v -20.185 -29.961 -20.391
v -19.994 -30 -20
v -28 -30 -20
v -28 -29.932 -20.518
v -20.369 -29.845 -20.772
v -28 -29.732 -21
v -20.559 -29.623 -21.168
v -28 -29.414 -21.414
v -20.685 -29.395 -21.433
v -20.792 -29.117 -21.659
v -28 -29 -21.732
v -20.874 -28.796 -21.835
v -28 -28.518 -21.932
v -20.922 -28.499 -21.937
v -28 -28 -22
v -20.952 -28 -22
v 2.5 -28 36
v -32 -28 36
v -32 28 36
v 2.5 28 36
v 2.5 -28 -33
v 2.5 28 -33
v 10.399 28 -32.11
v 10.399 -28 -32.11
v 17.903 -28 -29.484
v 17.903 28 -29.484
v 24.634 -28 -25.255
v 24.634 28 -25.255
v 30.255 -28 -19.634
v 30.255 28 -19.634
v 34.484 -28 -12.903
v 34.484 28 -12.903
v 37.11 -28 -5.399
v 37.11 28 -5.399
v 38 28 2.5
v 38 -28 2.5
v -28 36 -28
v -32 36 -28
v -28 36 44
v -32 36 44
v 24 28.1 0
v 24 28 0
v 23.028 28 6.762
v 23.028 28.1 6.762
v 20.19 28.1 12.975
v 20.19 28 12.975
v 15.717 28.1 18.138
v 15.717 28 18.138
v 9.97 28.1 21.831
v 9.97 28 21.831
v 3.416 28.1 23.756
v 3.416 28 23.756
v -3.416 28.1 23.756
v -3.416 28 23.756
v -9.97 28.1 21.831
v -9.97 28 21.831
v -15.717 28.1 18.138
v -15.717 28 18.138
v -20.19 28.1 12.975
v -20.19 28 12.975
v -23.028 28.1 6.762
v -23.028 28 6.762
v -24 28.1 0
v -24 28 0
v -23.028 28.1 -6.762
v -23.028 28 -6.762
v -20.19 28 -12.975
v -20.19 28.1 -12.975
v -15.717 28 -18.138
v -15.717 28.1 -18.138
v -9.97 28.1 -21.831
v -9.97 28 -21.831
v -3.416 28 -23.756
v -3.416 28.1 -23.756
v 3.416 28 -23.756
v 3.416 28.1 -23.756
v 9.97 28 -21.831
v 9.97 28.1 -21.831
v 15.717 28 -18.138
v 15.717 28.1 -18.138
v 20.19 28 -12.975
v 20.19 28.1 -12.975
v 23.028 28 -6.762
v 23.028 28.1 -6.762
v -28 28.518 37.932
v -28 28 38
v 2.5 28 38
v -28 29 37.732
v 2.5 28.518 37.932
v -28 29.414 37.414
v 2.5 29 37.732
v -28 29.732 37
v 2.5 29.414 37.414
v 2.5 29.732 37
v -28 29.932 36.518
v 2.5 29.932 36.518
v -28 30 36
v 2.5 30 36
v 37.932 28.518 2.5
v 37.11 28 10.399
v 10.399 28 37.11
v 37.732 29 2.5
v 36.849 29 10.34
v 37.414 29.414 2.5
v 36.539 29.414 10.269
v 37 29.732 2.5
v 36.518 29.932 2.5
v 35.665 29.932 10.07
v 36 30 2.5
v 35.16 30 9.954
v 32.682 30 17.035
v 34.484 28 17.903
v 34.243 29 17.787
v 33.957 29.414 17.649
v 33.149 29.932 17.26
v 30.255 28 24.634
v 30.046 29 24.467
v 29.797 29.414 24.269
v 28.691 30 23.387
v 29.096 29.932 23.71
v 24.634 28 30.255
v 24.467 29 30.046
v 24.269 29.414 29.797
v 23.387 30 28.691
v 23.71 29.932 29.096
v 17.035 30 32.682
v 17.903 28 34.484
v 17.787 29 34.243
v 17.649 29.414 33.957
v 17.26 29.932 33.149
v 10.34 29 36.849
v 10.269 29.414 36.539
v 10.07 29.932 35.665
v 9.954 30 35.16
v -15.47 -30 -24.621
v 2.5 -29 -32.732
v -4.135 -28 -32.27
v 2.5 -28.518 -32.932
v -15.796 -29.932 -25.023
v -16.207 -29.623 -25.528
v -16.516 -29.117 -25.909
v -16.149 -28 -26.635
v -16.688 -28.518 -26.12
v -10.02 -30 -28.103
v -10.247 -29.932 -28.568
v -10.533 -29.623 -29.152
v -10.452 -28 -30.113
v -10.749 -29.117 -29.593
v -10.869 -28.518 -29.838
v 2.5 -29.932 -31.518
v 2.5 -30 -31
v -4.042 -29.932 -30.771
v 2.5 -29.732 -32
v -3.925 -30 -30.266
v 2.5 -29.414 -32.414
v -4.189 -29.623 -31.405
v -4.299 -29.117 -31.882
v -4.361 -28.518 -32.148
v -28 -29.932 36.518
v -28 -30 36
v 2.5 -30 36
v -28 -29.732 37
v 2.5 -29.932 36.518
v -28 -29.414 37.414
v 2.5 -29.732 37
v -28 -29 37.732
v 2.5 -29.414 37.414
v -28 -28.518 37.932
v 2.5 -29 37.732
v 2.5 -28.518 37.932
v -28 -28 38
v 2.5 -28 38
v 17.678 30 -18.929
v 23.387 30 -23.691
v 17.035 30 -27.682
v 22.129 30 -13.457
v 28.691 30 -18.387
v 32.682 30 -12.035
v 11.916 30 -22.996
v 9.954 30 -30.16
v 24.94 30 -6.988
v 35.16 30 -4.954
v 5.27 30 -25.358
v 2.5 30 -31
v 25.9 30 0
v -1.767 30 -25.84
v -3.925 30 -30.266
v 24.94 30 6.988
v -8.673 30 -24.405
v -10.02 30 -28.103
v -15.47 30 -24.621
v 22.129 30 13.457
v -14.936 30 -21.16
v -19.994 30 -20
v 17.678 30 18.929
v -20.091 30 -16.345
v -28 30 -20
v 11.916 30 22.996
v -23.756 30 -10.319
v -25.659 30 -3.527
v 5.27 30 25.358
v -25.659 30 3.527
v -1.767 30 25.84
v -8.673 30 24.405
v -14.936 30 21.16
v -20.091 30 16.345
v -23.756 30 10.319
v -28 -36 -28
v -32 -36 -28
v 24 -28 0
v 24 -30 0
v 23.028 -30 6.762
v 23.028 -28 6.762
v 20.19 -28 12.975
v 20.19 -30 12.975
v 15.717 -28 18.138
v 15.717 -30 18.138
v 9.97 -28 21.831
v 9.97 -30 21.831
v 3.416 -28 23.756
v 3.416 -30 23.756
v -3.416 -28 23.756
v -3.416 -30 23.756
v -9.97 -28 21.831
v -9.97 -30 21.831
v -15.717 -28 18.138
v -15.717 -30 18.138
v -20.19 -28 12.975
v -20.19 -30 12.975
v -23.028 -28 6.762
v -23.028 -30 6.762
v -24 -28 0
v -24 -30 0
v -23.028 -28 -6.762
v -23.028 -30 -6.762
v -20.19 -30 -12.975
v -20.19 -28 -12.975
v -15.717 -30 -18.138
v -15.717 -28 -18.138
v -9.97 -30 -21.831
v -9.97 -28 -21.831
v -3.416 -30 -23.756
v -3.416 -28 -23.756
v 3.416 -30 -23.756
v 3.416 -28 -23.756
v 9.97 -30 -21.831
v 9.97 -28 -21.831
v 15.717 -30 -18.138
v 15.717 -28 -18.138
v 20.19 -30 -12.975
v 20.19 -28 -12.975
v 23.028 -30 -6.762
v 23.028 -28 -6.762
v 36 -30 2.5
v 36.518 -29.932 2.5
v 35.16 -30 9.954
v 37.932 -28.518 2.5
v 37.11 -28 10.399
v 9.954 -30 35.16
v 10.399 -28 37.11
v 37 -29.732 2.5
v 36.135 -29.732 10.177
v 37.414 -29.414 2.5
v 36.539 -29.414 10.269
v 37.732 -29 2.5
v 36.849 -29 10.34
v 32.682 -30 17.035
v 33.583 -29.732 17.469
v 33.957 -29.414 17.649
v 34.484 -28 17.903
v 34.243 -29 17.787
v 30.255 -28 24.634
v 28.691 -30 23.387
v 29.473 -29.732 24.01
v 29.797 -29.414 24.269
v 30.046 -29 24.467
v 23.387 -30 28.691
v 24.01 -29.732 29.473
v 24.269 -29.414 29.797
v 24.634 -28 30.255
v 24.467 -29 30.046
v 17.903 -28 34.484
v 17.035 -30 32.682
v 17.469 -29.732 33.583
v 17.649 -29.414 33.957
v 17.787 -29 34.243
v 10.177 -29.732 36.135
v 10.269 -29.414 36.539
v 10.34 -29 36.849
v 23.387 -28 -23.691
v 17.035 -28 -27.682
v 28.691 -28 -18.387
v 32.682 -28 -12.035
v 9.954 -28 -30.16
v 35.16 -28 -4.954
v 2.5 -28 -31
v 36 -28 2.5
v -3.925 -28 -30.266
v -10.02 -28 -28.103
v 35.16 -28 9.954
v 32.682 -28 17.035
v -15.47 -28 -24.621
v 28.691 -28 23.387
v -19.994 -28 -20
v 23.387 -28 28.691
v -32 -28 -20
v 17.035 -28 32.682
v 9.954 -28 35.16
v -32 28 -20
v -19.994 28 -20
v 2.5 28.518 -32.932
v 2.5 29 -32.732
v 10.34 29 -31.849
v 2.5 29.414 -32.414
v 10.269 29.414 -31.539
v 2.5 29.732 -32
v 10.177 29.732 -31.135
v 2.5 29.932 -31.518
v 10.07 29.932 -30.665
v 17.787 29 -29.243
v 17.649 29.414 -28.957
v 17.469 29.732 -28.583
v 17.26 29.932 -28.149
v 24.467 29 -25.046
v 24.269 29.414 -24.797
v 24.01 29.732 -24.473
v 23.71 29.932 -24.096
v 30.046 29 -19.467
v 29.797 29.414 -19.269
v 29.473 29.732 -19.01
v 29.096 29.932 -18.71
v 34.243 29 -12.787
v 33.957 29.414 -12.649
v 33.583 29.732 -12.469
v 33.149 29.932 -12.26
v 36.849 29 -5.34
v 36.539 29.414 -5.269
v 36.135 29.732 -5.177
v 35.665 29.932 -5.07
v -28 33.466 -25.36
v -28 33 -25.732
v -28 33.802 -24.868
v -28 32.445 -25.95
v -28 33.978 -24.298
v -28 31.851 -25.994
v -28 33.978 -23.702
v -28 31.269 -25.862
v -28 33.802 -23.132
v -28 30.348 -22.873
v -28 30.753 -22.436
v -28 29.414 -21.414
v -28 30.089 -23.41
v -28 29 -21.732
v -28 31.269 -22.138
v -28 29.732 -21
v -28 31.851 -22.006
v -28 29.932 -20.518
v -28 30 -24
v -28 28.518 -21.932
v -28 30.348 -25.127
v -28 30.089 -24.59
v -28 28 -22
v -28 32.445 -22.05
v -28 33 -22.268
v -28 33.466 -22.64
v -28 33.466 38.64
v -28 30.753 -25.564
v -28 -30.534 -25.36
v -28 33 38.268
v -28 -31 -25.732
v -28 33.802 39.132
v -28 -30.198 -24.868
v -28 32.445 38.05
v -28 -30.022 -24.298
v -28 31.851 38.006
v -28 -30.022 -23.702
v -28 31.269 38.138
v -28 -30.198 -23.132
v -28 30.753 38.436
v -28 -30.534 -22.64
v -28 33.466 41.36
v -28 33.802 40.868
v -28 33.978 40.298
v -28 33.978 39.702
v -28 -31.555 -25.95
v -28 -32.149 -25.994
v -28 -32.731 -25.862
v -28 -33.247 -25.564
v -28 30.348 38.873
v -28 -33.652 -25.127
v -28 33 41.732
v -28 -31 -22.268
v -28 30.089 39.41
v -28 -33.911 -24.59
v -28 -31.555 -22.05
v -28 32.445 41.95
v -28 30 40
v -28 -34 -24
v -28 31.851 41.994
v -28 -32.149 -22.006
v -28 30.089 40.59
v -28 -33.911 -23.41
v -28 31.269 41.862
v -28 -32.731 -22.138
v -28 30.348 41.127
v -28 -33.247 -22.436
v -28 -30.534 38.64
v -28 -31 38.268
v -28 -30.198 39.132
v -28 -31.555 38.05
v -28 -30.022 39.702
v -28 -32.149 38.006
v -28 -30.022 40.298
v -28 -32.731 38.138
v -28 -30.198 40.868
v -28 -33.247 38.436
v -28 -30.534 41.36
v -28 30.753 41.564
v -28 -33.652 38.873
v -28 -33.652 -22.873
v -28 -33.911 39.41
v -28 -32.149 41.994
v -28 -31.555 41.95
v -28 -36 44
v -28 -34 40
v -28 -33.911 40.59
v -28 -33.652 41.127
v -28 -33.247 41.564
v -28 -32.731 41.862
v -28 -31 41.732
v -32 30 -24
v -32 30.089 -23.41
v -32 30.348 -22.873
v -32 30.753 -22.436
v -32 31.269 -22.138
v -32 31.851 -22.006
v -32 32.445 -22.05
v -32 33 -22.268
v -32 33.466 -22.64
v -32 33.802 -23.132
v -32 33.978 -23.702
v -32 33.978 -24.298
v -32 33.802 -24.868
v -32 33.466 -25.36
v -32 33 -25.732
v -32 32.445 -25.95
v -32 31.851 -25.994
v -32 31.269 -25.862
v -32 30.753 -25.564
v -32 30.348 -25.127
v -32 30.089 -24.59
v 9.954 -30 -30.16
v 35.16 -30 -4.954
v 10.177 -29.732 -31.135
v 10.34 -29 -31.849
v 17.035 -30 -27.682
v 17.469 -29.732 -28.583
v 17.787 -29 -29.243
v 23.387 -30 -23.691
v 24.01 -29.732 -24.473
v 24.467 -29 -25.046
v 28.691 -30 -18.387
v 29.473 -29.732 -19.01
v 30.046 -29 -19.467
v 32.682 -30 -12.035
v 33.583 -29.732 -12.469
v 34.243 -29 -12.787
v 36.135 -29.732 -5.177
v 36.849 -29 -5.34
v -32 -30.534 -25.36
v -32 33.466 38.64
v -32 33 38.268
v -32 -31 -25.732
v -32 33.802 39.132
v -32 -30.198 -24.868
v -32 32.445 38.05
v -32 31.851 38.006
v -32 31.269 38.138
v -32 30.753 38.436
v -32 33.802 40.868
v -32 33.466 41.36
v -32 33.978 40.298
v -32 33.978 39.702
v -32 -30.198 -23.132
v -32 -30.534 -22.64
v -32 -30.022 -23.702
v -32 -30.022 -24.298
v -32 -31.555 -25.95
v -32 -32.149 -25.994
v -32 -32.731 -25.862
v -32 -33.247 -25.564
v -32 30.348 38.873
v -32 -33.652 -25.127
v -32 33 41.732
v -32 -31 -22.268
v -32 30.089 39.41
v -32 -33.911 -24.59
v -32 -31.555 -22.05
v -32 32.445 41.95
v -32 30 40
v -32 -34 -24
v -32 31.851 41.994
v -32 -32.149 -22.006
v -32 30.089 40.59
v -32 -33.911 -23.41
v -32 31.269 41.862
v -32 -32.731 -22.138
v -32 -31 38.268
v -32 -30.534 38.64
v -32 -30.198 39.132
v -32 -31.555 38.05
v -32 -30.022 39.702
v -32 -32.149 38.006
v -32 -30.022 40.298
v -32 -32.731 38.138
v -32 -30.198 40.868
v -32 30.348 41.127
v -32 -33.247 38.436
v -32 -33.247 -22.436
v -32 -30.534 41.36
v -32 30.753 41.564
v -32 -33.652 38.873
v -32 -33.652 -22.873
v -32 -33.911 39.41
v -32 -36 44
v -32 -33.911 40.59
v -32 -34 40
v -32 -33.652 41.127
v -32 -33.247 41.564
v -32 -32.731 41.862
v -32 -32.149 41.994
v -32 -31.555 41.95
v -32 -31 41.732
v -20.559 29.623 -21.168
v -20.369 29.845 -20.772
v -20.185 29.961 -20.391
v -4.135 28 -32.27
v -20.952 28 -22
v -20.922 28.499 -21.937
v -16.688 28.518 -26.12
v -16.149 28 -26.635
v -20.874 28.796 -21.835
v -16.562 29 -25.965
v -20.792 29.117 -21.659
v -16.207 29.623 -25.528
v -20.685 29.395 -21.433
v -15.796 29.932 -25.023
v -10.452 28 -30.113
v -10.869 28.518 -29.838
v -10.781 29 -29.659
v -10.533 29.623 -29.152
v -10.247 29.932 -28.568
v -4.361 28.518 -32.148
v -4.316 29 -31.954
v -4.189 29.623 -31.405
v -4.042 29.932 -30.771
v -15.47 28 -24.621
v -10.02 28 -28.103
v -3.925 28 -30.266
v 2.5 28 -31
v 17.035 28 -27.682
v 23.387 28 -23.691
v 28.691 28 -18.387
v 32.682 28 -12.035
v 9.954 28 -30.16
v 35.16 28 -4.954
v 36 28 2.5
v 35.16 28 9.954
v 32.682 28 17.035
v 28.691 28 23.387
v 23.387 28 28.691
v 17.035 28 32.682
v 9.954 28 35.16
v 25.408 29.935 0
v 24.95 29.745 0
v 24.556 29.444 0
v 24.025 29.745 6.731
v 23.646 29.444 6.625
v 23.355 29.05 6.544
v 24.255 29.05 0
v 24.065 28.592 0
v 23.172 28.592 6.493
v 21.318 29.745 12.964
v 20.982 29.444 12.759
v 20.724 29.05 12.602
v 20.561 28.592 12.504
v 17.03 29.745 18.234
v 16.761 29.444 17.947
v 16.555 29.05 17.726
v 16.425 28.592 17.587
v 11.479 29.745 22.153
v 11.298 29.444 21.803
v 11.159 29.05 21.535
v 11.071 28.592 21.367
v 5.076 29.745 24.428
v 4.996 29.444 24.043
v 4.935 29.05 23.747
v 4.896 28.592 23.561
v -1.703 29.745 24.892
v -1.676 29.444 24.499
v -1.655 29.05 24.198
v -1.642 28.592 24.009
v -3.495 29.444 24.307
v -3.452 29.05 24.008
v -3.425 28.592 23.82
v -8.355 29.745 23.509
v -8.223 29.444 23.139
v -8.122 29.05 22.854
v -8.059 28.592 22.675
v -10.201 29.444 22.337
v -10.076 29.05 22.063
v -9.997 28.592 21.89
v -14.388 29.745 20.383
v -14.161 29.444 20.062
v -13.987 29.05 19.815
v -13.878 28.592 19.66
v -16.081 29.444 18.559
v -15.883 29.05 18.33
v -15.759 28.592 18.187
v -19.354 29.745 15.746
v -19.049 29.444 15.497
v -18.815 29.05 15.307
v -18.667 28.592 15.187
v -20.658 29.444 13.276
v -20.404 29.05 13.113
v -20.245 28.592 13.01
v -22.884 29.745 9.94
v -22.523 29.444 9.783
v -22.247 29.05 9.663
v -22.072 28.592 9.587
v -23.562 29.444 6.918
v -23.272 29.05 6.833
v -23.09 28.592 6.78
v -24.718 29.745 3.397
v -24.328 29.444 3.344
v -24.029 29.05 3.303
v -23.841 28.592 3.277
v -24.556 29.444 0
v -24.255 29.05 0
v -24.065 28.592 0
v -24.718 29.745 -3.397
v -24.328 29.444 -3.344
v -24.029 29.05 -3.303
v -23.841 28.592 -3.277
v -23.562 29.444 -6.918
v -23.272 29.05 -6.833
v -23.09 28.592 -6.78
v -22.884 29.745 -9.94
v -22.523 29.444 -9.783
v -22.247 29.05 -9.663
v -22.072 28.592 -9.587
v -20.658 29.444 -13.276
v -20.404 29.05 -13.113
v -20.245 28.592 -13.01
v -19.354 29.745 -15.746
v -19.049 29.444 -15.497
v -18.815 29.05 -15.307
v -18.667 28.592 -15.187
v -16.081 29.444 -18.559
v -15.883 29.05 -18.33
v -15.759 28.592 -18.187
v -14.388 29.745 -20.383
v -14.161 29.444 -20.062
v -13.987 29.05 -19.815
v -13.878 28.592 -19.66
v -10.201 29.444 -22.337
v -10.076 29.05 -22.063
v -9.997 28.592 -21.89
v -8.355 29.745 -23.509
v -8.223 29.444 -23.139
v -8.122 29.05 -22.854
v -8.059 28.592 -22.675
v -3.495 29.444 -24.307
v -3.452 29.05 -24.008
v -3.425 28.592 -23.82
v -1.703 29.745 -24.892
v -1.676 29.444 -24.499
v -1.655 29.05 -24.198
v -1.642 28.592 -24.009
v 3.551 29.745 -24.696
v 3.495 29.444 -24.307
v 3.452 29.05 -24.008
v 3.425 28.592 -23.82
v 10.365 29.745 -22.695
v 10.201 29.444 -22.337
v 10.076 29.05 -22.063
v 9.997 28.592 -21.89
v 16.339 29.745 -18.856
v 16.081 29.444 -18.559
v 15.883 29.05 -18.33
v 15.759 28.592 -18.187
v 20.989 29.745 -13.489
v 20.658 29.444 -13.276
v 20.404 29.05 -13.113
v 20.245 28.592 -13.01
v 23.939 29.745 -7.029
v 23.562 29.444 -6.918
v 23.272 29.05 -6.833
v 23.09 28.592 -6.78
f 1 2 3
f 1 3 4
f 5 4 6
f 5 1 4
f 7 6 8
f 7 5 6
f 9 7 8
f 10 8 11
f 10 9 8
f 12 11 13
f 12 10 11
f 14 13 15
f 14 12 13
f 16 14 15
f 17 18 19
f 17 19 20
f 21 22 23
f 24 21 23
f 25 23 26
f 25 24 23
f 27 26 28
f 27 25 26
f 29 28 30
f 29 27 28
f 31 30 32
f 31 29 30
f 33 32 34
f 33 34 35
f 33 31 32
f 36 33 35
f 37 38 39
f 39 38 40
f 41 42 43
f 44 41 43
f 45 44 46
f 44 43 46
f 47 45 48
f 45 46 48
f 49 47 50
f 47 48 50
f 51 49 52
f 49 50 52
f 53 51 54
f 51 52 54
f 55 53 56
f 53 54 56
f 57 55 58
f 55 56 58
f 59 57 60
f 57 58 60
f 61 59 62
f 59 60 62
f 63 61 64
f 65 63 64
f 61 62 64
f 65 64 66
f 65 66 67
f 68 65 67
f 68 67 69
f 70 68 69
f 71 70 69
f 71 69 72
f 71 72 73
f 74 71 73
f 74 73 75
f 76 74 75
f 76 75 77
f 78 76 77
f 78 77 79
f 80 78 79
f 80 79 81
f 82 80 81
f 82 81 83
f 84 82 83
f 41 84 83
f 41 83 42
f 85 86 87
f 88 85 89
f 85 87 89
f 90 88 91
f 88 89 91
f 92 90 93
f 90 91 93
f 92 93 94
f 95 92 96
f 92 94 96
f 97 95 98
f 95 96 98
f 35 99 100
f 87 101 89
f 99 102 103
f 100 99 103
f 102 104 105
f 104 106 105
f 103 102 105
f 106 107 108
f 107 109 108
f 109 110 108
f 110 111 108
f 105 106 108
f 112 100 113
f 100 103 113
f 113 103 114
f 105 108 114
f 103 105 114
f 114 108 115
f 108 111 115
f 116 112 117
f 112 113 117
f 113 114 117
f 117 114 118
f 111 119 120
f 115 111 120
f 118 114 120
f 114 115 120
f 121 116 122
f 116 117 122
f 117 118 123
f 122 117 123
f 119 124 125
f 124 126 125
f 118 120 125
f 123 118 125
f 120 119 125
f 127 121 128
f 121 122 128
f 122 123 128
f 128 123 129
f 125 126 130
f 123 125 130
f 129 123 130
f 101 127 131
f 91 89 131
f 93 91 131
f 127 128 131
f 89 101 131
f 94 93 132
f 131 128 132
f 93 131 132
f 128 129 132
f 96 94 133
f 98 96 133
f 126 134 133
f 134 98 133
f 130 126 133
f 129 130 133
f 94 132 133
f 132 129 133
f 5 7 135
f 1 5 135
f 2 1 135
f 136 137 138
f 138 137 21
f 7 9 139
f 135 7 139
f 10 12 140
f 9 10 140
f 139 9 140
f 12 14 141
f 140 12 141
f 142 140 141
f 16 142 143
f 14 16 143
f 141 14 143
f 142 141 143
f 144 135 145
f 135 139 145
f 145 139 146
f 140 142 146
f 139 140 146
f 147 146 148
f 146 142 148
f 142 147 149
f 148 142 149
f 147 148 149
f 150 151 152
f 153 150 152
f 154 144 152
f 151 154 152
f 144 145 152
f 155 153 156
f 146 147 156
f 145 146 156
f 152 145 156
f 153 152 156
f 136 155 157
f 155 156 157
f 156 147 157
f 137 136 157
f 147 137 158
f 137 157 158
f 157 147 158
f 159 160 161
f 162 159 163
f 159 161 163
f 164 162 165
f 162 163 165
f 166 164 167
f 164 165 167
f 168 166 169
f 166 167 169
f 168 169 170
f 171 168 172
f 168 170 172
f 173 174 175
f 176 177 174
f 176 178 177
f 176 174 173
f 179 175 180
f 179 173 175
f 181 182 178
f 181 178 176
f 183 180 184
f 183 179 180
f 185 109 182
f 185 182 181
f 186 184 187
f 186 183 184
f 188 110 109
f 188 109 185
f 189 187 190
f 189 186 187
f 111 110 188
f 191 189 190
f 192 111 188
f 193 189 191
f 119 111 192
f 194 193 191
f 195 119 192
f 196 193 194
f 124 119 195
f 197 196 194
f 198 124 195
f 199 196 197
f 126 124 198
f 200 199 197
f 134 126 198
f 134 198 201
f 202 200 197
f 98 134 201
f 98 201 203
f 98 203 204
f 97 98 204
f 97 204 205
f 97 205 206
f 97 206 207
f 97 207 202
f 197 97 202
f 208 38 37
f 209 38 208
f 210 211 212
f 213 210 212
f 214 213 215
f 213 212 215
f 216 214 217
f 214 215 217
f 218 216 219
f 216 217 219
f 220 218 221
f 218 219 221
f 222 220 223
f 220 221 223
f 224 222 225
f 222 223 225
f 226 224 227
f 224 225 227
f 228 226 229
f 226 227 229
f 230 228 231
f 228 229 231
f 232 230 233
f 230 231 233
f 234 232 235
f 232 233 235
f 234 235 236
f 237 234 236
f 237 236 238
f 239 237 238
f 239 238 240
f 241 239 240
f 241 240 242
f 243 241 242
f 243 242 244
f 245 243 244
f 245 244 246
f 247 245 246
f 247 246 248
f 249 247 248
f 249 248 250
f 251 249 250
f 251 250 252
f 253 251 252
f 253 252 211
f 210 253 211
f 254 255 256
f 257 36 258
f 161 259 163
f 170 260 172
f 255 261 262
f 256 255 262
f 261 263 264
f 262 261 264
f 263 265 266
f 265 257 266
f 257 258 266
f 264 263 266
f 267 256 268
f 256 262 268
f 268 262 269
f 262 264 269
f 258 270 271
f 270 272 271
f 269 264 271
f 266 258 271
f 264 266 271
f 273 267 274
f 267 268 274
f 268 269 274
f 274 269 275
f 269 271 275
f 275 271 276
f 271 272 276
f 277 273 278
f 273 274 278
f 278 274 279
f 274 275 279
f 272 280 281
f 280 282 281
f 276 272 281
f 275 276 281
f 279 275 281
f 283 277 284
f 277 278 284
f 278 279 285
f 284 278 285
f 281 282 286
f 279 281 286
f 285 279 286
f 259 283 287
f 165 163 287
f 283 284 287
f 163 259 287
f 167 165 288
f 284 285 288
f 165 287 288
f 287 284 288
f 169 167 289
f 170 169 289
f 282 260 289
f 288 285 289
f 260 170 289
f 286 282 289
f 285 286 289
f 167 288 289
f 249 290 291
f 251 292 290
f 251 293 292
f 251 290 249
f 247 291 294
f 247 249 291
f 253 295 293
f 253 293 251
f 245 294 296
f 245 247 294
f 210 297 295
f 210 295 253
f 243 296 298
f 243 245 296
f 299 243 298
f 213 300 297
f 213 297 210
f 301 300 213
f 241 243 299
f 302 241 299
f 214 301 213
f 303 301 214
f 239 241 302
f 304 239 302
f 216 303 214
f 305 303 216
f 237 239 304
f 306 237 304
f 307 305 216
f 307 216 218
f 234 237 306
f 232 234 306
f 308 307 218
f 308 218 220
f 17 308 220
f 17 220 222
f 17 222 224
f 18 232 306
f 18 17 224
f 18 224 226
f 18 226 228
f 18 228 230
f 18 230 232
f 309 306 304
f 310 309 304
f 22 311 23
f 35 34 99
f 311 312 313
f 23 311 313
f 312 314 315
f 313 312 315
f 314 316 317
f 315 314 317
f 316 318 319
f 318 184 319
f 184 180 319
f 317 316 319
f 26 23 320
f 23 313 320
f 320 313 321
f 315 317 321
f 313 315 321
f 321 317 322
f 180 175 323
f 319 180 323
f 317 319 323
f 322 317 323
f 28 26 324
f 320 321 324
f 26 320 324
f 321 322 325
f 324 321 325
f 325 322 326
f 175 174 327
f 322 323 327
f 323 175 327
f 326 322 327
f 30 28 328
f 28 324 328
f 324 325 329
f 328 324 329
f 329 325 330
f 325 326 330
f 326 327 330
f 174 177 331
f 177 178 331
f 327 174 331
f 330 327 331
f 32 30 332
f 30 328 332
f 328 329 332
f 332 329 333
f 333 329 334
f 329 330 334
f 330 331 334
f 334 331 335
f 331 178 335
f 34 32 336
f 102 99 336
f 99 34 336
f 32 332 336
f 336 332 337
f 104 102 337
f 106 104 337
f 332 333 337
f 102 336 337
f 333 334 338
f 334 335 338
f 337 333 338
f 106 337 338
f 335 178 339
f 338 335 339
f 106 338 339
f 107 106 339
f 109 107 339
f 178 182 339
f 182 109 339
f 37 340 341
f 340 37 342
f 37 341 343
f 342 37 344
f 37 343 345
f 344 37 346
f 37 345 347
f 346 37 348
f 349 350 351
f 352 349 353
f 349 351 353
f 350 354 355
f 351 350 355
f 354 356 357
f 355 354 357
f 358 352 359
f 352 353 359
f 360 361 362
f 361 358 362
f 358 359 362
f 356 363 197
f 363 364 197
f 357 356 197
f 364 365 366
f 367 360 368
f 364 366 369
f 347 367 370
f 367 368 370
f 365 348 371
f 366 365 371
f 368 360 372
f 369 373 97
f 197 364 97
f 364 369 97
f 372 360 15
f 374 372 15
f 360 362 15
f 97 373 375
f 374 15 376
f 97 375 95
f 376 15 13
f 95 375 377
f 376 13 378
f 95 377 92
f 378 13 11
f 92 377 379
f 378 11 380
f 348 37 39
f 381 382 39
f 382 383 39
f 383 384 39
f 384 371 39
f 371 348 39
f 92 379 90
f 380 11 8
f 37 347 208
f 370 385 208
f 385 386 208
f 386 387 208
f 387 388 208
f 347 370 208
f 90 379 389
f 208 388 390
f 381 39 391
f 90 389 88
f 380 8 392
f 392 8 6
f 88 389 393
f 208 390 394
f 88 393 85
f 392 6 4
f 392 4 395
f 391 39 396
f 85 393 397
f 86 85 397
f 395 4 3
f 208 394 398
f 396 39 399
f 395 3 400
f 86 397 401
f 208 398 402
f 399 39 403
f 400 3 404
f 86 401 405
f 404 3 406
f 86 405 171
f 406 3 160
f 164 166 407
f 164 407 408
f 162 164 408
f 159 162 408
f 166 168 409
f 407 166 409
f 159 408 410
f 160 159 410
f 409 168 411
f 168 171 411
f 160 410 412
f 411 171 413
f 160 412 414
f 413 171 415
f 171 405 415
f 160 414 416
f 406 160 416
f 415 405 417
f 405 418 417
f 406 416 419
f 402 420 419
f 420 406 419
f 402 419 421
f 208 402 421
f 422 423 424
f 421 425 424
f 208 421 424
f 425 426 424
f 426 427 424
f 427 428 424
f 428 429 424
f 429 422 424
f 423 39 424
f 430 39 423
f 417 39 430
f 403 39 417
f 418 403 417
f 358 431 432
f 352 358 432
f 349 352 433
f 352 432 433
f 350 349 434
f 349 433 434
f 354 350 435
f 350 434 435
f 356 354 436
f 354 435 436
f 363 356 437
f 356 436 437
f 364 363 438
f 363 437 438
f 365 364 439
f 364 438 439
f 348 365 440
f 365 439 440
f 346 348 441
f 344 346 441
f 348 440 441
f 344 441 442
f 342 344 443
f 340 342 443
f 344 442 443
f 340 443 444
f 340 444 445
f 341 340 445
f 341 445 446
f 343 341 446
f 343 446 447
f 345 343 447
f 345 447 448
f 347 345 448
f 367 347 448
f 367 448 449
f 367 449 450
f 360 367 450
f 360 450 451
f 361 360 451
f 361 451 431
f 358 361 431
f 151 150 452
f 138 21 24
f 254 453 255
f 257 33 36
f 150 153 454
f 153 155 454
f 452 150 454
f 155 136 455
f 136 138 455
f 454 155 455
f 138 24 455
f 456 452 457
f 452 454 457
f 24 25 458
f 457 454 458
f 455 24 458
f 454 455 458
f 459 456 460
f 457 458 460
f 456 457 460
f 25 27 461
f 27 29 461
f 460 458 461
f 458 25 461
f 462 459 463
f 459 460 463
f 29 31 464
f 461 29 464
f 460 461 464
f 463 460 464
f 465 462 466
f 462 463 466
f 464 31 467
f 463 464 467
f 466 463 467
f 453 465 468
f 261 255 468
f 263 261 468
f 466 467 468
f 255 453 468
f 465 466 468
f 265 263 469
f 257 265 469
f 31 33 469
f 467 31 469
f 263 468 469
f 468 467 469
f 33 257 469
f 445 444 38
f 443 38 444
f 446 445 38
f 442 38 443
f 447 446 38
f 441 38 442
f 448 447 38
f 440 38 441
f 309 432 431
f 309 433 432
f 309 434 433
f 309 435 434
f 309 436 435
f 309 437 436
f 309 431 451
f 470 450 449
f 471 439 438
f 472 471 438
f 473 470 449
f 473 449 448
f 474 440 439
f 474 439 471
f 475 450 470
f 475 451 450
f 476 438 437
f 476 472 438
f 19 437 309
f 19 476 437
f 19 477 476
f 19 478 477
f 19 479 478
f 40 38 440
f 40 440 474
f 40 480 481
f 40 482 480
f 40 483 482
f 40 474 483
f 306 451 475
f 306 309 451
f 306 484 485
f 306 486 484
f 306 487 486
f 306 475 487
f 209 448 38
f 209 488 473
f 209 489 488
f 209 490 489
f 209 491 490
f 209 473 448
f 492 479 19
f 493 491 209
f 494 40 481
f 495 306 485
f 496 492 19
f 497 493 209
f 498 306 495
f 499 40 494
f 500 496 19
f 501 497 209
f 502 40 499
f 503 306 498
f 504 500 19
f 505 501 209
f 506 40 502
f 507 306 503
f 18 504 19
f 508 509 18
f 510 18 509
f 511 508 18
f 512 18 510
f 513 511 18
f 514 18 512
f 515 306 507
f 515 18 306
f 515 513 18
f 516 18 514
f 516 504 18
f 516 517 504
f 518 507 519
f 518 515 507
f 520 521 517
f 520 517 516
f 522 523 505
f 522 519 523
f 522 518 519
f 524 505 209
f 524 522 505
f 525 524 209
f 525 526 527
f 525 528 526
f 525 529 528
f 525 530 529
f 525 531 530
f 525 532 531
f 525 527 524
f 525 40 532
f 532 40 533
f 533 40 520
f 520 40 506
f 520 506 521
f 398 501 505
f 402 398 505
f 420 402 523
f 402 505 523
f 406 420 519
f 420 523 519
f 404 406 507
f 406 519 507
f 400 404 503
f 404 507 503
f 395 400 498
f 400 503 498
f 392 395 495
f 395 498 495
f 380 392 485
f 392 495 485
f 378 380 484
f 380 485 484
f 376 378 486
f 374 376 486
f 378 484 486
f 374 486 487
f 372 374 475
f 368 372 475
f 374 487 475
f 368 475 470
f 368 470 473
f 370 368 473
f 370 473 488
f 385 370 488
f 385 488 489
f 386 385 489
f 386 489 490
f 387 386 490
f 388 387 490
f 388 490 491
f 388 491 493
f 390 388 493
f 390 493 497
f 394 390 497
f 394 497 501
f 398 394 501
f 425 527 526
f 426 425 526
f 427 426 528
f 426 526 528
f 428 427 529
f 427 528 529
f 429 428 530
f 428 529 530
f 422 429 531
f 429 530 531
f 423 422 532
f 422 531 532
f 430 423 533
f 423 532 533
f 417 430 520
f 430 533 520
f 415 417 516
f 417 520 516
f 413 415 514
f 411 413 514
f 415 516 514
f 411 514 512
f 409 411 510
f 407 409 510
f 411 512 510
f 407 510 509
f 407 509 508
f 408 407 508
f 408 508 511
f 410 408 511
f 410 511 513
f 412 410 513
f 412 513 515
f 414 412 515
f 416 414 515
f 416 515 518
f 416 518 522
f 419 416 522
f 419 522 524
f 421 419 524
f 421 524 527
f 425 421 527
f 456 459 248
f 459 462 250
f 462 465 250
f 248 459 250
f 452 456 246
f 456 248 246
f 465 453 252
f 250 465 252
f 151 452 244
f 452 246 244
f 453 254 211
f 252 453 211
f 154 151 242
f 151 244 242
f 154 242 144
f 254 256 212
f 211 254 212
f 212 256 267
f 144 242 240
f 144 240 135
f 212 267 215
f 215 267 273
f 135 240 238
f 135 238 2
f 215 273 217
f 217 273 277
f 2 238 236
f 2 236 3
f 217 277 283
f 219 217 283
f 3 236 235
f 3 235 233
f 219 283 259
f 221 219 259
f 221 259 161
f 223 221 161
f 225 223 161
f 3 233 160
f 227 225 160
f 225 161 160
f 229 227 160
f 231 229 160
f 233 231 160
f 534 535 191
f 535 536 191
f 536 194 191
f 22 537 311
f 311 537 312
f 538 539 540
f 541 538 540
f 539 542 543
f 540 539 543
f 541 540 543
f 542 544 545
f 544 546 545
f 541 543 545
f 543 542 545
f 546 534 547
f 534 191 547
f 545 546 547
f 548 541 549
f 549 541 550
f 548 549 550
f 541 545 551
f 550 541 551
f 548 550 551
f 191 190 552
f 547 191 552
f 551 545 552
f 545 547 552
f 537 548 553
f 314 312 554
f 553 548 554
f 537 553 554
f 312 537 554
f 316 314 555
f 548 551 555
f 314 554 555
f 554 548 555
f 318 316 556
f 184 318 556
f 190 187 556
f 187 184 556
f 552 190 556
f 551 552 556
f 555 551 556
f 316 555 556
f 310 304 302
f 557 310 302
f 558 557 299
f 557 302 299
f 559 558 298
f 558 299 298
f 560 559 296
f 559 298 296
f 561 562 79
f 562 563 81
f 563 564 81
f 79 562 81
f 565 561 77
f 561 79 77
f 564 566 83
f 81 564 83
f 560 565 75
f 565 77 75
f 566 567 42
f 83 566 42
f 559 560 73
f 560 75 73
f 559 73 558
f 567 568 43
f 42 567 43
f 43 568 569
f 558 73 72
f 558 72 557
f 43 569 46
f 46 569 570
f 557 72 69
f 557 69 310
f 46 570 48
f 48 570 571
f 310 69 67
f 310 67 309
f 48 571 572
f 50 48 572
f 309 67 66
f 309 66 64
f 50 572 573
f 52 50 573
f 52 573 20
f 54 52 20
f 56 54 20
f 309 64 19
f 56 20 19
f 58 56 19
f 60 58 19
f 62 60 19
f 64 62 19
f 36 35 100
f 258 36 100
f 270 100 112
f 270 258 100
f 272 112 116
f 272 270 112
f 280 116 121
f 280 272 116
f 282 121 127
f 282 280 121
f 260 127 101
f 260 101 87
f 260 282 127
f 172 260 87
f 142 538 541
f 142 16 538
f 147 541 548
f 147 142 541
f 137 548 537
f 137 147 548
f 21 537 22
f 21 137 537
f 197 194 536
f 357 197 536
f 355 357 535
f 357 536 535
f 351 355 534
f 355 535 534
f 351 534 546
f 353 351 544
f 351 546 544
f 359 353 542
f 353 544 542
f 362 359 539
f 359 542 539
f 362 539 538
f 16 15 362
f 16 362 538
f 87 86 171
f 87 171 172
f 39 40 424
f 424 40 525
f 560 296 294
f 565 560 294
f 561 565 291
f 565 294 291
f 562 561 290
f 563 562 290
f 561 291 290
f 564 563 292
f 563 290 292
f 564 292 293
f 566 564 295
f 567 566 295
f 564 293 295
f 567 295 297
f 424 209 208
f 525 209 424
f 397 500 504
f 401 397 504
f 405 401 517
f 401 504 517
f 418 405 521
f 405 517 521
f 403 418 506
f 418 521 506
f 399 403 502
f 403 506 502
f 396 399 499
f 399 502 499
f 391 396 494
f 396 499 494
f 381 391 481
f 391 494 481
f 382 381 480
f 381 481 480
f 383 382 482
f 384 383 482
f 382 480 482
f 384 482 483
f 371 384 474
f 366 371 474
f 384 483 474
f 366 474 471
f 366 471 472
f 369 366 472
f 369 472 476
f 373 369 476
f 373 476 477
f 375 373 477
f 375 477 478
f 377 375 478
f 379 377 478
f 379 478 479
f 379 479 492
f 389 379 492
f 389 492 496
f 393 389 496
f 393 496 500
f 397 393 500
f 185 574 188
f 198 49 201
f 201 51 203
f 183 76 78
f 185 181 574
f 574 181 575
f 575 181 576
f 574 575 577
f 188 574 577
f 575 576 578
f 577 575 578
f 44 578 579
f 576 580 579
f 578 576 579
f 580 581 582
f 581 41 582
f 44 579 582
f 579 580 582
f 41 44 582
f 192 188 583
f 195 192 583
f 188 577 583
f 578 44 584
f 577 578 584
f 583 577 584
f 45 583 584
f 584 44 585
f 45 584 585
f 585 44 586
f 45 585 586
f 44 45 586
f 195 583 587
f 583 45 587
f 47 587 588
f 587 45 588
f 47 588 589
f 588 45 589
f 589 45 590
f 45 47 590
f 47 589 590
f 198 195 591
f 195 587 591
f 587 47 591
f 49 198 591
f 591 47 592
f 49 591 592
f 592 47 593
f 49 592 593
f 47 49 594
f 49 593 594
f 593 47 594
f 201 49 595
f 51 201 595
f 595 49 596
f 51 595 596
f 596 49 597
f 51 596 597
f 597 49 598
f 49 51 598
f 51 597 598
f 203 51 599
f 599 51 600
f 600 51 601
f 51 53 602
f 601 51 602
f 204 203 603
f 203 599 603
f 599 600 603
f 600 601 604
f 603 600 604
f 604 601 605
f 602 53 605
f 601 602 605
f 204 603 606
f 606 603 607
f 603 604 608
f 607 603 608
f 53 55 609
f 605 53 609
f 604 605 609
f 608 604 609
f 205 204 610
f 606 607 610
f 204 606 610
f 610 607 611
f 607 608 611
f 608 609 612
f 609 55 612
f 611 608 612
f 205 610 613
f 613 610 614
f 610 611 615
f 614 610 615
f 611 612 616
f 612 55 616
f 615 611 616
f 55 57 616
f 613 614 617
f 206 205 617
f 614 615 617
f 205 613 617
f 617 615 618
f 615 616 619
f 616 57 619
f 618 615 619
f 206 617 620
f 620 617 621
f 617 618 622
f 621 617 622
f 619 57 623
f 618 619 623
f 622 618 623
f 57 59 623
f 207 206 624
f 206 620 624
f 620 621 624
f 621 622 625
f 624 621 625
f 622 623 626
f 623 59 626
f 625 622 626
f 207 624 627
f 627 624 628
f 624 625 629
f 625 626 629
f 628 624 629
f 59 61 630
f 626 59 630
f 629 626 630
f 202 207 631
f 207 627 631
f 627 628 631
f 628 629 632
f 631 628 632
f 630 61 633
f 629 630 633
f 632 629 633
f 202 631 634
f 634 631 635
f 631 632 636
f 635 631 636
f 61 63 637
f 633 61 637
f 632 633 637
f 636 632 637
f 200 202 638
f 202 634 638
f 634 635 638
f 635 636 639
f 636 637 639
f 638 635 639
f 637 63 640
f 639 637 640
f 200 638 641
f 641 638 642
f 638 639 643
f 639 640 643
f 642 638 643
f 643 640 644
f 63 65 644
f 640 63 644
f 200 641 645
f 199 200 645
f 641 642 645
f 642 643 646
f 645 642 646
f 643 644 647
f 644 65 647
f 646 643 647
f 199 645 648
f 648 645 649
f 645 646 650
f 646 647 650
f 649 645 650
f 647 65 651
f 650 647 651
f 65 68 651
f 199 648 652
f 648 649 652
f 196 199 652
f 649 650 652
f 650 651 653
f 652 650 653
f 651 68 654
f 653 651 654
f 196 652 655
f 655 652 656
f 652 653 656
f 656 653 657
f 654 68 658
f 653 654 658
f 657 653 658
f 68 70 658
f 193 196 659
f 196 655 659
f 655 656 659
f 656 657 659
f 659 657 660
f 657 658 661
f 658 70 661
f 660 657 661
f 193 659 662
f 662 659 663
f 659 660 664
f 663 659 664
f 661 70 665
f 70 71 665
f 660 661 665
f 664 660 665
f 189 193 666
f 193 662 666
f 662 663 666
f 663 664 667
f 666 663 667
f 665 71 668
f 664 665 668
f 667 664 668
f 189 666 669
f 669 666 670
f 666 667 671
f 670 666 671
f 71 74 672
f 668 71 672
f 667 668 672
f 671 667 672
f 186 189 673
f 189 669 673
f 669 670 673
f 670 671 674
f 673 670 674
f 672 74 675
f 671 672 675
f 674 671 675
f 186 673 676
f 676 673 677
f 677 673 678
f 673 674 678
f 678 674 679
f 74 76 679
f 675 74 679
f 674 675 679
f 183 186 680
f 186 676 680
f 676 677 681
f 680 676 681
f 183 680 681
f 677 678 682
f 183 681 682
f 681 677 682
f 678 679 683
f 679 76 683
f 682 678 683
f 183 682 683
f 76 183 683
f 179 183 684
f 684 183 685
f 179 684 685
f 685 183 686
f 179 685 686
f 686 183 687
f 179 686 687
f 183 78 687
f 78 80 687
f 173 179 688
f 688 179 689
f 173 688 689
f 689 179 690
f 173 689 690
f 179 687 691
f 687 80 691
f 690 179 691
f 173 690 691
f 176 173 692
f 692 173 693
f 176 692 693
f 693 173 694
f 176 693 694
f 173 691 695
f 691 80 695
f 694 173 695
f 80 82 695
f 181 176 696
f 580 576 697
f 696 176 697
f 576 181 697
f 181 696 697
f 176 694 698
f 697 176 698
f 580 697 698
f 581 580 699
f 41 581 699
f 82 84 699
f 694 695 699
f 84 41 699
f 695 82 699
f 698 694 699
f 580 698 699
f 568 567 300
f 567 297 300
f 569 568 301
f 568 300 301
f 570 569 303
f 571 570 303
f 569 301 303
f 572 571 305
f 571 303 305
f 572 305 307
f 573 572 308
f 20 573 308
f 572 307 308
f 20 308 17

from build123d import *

# Parameters (mm, degrees)
PAD_DEPTH       = 28
THICKNESS_T     = 2
SKETCH001_R     = 24
POCKET_DEPTH    = 60.001
FILLET_R        = 1.9
SKETCH002_W     = 72
SKETCH002_H     = 72
SKETCH002_W_2   = 56
SKETCH002_H_2   = 56
PAD001_DEPTH    = 4
SKETCH003_R     = 2
POCKET001_DEPTH = 5


with BuildPart() as part:
    # Sketch → Pad (new body, symmetric)
    with BuildSketch(Plane.XZ):
        with BuildLine():
            Line((-32, -20), (-32, 36))
            Line((-32, 36), (2.5, 36))
            ThreePointArc((36, 2.5), (26.188077, 26.188077), (2.5, 36))
            ThreePointArc((2.5, -31), (26.188077, -21.188077), (36, 2.5))
            ThreePointArc((-19.994444, -20), (-10.019984, -28.102734), (2.5, -31))
            Line((-32, -20), (-19.994444, -20))
        make_face()
    extrude(amount=PAD_DEPTH, both=True)

    # Thickness
    thickness_openings = [part.faces().sort_by_distance(p)[0] for p in [
        (-32, 0, 8),
    ]]
    offset(amount=THICKNESS_T, openings=thickness_openings)

    # Sketch001 (on Face16 of Thickness) → Pocket (cut, through all)
    with BuildSketch(Plane.XZ.offset(30)):
        Circle(SKETCH001_R)
    extrude(amount=-POCKET_DEPTH, mode=Mode.SUBTRACT)

    # Fillet
    fillet_edges = [part.edges().sort_by_distance(p)[0] for p in [
        (-24, 30, 0),
    ]]
    fillet(fillet_edges, radius=FILLET_R)

    # Sketch002 (on Face3 of Fillet) → Pad001 (join)
    with BuildSketch(Plane(origin=(-32, 0, 0), x_dir=(0, -1, 0), z_dir=(-1, 0, 0))):
        with Locations((0, 8)):
            Rectangle(SKETCH002_W, SKETCH002_H)
        with Locations((0, 8)):
            Rectangle(SKETCH002_W_2, SKETCH002_H_2, mode=Mode.SUBTRACT)
    extrude(amount=-PAD001_DEPTH)

    # Sketch003 (on Face25 of Pad001) → Pocket001 (cut)
    with BuildSketch(Plane(origin=(-32, 0, 0), x_dir=(0, -1, 0), z_dir=(-1, 0, 0))):
        with Locations((-32, 40)):
            Circle(SKETCH003_R)
        with Locations((32, 40)):
            Circle(SKETCH003_R)
        with Locations((32, -24)):
            Circle(SKETCH003_R)
        with Locations((-32, -24)):
            Circle(SKETCH003_R)
    extrude(amount=-POCKET001_DEPTH, mode=Mode.SUBTRACT)


solid = part.part
